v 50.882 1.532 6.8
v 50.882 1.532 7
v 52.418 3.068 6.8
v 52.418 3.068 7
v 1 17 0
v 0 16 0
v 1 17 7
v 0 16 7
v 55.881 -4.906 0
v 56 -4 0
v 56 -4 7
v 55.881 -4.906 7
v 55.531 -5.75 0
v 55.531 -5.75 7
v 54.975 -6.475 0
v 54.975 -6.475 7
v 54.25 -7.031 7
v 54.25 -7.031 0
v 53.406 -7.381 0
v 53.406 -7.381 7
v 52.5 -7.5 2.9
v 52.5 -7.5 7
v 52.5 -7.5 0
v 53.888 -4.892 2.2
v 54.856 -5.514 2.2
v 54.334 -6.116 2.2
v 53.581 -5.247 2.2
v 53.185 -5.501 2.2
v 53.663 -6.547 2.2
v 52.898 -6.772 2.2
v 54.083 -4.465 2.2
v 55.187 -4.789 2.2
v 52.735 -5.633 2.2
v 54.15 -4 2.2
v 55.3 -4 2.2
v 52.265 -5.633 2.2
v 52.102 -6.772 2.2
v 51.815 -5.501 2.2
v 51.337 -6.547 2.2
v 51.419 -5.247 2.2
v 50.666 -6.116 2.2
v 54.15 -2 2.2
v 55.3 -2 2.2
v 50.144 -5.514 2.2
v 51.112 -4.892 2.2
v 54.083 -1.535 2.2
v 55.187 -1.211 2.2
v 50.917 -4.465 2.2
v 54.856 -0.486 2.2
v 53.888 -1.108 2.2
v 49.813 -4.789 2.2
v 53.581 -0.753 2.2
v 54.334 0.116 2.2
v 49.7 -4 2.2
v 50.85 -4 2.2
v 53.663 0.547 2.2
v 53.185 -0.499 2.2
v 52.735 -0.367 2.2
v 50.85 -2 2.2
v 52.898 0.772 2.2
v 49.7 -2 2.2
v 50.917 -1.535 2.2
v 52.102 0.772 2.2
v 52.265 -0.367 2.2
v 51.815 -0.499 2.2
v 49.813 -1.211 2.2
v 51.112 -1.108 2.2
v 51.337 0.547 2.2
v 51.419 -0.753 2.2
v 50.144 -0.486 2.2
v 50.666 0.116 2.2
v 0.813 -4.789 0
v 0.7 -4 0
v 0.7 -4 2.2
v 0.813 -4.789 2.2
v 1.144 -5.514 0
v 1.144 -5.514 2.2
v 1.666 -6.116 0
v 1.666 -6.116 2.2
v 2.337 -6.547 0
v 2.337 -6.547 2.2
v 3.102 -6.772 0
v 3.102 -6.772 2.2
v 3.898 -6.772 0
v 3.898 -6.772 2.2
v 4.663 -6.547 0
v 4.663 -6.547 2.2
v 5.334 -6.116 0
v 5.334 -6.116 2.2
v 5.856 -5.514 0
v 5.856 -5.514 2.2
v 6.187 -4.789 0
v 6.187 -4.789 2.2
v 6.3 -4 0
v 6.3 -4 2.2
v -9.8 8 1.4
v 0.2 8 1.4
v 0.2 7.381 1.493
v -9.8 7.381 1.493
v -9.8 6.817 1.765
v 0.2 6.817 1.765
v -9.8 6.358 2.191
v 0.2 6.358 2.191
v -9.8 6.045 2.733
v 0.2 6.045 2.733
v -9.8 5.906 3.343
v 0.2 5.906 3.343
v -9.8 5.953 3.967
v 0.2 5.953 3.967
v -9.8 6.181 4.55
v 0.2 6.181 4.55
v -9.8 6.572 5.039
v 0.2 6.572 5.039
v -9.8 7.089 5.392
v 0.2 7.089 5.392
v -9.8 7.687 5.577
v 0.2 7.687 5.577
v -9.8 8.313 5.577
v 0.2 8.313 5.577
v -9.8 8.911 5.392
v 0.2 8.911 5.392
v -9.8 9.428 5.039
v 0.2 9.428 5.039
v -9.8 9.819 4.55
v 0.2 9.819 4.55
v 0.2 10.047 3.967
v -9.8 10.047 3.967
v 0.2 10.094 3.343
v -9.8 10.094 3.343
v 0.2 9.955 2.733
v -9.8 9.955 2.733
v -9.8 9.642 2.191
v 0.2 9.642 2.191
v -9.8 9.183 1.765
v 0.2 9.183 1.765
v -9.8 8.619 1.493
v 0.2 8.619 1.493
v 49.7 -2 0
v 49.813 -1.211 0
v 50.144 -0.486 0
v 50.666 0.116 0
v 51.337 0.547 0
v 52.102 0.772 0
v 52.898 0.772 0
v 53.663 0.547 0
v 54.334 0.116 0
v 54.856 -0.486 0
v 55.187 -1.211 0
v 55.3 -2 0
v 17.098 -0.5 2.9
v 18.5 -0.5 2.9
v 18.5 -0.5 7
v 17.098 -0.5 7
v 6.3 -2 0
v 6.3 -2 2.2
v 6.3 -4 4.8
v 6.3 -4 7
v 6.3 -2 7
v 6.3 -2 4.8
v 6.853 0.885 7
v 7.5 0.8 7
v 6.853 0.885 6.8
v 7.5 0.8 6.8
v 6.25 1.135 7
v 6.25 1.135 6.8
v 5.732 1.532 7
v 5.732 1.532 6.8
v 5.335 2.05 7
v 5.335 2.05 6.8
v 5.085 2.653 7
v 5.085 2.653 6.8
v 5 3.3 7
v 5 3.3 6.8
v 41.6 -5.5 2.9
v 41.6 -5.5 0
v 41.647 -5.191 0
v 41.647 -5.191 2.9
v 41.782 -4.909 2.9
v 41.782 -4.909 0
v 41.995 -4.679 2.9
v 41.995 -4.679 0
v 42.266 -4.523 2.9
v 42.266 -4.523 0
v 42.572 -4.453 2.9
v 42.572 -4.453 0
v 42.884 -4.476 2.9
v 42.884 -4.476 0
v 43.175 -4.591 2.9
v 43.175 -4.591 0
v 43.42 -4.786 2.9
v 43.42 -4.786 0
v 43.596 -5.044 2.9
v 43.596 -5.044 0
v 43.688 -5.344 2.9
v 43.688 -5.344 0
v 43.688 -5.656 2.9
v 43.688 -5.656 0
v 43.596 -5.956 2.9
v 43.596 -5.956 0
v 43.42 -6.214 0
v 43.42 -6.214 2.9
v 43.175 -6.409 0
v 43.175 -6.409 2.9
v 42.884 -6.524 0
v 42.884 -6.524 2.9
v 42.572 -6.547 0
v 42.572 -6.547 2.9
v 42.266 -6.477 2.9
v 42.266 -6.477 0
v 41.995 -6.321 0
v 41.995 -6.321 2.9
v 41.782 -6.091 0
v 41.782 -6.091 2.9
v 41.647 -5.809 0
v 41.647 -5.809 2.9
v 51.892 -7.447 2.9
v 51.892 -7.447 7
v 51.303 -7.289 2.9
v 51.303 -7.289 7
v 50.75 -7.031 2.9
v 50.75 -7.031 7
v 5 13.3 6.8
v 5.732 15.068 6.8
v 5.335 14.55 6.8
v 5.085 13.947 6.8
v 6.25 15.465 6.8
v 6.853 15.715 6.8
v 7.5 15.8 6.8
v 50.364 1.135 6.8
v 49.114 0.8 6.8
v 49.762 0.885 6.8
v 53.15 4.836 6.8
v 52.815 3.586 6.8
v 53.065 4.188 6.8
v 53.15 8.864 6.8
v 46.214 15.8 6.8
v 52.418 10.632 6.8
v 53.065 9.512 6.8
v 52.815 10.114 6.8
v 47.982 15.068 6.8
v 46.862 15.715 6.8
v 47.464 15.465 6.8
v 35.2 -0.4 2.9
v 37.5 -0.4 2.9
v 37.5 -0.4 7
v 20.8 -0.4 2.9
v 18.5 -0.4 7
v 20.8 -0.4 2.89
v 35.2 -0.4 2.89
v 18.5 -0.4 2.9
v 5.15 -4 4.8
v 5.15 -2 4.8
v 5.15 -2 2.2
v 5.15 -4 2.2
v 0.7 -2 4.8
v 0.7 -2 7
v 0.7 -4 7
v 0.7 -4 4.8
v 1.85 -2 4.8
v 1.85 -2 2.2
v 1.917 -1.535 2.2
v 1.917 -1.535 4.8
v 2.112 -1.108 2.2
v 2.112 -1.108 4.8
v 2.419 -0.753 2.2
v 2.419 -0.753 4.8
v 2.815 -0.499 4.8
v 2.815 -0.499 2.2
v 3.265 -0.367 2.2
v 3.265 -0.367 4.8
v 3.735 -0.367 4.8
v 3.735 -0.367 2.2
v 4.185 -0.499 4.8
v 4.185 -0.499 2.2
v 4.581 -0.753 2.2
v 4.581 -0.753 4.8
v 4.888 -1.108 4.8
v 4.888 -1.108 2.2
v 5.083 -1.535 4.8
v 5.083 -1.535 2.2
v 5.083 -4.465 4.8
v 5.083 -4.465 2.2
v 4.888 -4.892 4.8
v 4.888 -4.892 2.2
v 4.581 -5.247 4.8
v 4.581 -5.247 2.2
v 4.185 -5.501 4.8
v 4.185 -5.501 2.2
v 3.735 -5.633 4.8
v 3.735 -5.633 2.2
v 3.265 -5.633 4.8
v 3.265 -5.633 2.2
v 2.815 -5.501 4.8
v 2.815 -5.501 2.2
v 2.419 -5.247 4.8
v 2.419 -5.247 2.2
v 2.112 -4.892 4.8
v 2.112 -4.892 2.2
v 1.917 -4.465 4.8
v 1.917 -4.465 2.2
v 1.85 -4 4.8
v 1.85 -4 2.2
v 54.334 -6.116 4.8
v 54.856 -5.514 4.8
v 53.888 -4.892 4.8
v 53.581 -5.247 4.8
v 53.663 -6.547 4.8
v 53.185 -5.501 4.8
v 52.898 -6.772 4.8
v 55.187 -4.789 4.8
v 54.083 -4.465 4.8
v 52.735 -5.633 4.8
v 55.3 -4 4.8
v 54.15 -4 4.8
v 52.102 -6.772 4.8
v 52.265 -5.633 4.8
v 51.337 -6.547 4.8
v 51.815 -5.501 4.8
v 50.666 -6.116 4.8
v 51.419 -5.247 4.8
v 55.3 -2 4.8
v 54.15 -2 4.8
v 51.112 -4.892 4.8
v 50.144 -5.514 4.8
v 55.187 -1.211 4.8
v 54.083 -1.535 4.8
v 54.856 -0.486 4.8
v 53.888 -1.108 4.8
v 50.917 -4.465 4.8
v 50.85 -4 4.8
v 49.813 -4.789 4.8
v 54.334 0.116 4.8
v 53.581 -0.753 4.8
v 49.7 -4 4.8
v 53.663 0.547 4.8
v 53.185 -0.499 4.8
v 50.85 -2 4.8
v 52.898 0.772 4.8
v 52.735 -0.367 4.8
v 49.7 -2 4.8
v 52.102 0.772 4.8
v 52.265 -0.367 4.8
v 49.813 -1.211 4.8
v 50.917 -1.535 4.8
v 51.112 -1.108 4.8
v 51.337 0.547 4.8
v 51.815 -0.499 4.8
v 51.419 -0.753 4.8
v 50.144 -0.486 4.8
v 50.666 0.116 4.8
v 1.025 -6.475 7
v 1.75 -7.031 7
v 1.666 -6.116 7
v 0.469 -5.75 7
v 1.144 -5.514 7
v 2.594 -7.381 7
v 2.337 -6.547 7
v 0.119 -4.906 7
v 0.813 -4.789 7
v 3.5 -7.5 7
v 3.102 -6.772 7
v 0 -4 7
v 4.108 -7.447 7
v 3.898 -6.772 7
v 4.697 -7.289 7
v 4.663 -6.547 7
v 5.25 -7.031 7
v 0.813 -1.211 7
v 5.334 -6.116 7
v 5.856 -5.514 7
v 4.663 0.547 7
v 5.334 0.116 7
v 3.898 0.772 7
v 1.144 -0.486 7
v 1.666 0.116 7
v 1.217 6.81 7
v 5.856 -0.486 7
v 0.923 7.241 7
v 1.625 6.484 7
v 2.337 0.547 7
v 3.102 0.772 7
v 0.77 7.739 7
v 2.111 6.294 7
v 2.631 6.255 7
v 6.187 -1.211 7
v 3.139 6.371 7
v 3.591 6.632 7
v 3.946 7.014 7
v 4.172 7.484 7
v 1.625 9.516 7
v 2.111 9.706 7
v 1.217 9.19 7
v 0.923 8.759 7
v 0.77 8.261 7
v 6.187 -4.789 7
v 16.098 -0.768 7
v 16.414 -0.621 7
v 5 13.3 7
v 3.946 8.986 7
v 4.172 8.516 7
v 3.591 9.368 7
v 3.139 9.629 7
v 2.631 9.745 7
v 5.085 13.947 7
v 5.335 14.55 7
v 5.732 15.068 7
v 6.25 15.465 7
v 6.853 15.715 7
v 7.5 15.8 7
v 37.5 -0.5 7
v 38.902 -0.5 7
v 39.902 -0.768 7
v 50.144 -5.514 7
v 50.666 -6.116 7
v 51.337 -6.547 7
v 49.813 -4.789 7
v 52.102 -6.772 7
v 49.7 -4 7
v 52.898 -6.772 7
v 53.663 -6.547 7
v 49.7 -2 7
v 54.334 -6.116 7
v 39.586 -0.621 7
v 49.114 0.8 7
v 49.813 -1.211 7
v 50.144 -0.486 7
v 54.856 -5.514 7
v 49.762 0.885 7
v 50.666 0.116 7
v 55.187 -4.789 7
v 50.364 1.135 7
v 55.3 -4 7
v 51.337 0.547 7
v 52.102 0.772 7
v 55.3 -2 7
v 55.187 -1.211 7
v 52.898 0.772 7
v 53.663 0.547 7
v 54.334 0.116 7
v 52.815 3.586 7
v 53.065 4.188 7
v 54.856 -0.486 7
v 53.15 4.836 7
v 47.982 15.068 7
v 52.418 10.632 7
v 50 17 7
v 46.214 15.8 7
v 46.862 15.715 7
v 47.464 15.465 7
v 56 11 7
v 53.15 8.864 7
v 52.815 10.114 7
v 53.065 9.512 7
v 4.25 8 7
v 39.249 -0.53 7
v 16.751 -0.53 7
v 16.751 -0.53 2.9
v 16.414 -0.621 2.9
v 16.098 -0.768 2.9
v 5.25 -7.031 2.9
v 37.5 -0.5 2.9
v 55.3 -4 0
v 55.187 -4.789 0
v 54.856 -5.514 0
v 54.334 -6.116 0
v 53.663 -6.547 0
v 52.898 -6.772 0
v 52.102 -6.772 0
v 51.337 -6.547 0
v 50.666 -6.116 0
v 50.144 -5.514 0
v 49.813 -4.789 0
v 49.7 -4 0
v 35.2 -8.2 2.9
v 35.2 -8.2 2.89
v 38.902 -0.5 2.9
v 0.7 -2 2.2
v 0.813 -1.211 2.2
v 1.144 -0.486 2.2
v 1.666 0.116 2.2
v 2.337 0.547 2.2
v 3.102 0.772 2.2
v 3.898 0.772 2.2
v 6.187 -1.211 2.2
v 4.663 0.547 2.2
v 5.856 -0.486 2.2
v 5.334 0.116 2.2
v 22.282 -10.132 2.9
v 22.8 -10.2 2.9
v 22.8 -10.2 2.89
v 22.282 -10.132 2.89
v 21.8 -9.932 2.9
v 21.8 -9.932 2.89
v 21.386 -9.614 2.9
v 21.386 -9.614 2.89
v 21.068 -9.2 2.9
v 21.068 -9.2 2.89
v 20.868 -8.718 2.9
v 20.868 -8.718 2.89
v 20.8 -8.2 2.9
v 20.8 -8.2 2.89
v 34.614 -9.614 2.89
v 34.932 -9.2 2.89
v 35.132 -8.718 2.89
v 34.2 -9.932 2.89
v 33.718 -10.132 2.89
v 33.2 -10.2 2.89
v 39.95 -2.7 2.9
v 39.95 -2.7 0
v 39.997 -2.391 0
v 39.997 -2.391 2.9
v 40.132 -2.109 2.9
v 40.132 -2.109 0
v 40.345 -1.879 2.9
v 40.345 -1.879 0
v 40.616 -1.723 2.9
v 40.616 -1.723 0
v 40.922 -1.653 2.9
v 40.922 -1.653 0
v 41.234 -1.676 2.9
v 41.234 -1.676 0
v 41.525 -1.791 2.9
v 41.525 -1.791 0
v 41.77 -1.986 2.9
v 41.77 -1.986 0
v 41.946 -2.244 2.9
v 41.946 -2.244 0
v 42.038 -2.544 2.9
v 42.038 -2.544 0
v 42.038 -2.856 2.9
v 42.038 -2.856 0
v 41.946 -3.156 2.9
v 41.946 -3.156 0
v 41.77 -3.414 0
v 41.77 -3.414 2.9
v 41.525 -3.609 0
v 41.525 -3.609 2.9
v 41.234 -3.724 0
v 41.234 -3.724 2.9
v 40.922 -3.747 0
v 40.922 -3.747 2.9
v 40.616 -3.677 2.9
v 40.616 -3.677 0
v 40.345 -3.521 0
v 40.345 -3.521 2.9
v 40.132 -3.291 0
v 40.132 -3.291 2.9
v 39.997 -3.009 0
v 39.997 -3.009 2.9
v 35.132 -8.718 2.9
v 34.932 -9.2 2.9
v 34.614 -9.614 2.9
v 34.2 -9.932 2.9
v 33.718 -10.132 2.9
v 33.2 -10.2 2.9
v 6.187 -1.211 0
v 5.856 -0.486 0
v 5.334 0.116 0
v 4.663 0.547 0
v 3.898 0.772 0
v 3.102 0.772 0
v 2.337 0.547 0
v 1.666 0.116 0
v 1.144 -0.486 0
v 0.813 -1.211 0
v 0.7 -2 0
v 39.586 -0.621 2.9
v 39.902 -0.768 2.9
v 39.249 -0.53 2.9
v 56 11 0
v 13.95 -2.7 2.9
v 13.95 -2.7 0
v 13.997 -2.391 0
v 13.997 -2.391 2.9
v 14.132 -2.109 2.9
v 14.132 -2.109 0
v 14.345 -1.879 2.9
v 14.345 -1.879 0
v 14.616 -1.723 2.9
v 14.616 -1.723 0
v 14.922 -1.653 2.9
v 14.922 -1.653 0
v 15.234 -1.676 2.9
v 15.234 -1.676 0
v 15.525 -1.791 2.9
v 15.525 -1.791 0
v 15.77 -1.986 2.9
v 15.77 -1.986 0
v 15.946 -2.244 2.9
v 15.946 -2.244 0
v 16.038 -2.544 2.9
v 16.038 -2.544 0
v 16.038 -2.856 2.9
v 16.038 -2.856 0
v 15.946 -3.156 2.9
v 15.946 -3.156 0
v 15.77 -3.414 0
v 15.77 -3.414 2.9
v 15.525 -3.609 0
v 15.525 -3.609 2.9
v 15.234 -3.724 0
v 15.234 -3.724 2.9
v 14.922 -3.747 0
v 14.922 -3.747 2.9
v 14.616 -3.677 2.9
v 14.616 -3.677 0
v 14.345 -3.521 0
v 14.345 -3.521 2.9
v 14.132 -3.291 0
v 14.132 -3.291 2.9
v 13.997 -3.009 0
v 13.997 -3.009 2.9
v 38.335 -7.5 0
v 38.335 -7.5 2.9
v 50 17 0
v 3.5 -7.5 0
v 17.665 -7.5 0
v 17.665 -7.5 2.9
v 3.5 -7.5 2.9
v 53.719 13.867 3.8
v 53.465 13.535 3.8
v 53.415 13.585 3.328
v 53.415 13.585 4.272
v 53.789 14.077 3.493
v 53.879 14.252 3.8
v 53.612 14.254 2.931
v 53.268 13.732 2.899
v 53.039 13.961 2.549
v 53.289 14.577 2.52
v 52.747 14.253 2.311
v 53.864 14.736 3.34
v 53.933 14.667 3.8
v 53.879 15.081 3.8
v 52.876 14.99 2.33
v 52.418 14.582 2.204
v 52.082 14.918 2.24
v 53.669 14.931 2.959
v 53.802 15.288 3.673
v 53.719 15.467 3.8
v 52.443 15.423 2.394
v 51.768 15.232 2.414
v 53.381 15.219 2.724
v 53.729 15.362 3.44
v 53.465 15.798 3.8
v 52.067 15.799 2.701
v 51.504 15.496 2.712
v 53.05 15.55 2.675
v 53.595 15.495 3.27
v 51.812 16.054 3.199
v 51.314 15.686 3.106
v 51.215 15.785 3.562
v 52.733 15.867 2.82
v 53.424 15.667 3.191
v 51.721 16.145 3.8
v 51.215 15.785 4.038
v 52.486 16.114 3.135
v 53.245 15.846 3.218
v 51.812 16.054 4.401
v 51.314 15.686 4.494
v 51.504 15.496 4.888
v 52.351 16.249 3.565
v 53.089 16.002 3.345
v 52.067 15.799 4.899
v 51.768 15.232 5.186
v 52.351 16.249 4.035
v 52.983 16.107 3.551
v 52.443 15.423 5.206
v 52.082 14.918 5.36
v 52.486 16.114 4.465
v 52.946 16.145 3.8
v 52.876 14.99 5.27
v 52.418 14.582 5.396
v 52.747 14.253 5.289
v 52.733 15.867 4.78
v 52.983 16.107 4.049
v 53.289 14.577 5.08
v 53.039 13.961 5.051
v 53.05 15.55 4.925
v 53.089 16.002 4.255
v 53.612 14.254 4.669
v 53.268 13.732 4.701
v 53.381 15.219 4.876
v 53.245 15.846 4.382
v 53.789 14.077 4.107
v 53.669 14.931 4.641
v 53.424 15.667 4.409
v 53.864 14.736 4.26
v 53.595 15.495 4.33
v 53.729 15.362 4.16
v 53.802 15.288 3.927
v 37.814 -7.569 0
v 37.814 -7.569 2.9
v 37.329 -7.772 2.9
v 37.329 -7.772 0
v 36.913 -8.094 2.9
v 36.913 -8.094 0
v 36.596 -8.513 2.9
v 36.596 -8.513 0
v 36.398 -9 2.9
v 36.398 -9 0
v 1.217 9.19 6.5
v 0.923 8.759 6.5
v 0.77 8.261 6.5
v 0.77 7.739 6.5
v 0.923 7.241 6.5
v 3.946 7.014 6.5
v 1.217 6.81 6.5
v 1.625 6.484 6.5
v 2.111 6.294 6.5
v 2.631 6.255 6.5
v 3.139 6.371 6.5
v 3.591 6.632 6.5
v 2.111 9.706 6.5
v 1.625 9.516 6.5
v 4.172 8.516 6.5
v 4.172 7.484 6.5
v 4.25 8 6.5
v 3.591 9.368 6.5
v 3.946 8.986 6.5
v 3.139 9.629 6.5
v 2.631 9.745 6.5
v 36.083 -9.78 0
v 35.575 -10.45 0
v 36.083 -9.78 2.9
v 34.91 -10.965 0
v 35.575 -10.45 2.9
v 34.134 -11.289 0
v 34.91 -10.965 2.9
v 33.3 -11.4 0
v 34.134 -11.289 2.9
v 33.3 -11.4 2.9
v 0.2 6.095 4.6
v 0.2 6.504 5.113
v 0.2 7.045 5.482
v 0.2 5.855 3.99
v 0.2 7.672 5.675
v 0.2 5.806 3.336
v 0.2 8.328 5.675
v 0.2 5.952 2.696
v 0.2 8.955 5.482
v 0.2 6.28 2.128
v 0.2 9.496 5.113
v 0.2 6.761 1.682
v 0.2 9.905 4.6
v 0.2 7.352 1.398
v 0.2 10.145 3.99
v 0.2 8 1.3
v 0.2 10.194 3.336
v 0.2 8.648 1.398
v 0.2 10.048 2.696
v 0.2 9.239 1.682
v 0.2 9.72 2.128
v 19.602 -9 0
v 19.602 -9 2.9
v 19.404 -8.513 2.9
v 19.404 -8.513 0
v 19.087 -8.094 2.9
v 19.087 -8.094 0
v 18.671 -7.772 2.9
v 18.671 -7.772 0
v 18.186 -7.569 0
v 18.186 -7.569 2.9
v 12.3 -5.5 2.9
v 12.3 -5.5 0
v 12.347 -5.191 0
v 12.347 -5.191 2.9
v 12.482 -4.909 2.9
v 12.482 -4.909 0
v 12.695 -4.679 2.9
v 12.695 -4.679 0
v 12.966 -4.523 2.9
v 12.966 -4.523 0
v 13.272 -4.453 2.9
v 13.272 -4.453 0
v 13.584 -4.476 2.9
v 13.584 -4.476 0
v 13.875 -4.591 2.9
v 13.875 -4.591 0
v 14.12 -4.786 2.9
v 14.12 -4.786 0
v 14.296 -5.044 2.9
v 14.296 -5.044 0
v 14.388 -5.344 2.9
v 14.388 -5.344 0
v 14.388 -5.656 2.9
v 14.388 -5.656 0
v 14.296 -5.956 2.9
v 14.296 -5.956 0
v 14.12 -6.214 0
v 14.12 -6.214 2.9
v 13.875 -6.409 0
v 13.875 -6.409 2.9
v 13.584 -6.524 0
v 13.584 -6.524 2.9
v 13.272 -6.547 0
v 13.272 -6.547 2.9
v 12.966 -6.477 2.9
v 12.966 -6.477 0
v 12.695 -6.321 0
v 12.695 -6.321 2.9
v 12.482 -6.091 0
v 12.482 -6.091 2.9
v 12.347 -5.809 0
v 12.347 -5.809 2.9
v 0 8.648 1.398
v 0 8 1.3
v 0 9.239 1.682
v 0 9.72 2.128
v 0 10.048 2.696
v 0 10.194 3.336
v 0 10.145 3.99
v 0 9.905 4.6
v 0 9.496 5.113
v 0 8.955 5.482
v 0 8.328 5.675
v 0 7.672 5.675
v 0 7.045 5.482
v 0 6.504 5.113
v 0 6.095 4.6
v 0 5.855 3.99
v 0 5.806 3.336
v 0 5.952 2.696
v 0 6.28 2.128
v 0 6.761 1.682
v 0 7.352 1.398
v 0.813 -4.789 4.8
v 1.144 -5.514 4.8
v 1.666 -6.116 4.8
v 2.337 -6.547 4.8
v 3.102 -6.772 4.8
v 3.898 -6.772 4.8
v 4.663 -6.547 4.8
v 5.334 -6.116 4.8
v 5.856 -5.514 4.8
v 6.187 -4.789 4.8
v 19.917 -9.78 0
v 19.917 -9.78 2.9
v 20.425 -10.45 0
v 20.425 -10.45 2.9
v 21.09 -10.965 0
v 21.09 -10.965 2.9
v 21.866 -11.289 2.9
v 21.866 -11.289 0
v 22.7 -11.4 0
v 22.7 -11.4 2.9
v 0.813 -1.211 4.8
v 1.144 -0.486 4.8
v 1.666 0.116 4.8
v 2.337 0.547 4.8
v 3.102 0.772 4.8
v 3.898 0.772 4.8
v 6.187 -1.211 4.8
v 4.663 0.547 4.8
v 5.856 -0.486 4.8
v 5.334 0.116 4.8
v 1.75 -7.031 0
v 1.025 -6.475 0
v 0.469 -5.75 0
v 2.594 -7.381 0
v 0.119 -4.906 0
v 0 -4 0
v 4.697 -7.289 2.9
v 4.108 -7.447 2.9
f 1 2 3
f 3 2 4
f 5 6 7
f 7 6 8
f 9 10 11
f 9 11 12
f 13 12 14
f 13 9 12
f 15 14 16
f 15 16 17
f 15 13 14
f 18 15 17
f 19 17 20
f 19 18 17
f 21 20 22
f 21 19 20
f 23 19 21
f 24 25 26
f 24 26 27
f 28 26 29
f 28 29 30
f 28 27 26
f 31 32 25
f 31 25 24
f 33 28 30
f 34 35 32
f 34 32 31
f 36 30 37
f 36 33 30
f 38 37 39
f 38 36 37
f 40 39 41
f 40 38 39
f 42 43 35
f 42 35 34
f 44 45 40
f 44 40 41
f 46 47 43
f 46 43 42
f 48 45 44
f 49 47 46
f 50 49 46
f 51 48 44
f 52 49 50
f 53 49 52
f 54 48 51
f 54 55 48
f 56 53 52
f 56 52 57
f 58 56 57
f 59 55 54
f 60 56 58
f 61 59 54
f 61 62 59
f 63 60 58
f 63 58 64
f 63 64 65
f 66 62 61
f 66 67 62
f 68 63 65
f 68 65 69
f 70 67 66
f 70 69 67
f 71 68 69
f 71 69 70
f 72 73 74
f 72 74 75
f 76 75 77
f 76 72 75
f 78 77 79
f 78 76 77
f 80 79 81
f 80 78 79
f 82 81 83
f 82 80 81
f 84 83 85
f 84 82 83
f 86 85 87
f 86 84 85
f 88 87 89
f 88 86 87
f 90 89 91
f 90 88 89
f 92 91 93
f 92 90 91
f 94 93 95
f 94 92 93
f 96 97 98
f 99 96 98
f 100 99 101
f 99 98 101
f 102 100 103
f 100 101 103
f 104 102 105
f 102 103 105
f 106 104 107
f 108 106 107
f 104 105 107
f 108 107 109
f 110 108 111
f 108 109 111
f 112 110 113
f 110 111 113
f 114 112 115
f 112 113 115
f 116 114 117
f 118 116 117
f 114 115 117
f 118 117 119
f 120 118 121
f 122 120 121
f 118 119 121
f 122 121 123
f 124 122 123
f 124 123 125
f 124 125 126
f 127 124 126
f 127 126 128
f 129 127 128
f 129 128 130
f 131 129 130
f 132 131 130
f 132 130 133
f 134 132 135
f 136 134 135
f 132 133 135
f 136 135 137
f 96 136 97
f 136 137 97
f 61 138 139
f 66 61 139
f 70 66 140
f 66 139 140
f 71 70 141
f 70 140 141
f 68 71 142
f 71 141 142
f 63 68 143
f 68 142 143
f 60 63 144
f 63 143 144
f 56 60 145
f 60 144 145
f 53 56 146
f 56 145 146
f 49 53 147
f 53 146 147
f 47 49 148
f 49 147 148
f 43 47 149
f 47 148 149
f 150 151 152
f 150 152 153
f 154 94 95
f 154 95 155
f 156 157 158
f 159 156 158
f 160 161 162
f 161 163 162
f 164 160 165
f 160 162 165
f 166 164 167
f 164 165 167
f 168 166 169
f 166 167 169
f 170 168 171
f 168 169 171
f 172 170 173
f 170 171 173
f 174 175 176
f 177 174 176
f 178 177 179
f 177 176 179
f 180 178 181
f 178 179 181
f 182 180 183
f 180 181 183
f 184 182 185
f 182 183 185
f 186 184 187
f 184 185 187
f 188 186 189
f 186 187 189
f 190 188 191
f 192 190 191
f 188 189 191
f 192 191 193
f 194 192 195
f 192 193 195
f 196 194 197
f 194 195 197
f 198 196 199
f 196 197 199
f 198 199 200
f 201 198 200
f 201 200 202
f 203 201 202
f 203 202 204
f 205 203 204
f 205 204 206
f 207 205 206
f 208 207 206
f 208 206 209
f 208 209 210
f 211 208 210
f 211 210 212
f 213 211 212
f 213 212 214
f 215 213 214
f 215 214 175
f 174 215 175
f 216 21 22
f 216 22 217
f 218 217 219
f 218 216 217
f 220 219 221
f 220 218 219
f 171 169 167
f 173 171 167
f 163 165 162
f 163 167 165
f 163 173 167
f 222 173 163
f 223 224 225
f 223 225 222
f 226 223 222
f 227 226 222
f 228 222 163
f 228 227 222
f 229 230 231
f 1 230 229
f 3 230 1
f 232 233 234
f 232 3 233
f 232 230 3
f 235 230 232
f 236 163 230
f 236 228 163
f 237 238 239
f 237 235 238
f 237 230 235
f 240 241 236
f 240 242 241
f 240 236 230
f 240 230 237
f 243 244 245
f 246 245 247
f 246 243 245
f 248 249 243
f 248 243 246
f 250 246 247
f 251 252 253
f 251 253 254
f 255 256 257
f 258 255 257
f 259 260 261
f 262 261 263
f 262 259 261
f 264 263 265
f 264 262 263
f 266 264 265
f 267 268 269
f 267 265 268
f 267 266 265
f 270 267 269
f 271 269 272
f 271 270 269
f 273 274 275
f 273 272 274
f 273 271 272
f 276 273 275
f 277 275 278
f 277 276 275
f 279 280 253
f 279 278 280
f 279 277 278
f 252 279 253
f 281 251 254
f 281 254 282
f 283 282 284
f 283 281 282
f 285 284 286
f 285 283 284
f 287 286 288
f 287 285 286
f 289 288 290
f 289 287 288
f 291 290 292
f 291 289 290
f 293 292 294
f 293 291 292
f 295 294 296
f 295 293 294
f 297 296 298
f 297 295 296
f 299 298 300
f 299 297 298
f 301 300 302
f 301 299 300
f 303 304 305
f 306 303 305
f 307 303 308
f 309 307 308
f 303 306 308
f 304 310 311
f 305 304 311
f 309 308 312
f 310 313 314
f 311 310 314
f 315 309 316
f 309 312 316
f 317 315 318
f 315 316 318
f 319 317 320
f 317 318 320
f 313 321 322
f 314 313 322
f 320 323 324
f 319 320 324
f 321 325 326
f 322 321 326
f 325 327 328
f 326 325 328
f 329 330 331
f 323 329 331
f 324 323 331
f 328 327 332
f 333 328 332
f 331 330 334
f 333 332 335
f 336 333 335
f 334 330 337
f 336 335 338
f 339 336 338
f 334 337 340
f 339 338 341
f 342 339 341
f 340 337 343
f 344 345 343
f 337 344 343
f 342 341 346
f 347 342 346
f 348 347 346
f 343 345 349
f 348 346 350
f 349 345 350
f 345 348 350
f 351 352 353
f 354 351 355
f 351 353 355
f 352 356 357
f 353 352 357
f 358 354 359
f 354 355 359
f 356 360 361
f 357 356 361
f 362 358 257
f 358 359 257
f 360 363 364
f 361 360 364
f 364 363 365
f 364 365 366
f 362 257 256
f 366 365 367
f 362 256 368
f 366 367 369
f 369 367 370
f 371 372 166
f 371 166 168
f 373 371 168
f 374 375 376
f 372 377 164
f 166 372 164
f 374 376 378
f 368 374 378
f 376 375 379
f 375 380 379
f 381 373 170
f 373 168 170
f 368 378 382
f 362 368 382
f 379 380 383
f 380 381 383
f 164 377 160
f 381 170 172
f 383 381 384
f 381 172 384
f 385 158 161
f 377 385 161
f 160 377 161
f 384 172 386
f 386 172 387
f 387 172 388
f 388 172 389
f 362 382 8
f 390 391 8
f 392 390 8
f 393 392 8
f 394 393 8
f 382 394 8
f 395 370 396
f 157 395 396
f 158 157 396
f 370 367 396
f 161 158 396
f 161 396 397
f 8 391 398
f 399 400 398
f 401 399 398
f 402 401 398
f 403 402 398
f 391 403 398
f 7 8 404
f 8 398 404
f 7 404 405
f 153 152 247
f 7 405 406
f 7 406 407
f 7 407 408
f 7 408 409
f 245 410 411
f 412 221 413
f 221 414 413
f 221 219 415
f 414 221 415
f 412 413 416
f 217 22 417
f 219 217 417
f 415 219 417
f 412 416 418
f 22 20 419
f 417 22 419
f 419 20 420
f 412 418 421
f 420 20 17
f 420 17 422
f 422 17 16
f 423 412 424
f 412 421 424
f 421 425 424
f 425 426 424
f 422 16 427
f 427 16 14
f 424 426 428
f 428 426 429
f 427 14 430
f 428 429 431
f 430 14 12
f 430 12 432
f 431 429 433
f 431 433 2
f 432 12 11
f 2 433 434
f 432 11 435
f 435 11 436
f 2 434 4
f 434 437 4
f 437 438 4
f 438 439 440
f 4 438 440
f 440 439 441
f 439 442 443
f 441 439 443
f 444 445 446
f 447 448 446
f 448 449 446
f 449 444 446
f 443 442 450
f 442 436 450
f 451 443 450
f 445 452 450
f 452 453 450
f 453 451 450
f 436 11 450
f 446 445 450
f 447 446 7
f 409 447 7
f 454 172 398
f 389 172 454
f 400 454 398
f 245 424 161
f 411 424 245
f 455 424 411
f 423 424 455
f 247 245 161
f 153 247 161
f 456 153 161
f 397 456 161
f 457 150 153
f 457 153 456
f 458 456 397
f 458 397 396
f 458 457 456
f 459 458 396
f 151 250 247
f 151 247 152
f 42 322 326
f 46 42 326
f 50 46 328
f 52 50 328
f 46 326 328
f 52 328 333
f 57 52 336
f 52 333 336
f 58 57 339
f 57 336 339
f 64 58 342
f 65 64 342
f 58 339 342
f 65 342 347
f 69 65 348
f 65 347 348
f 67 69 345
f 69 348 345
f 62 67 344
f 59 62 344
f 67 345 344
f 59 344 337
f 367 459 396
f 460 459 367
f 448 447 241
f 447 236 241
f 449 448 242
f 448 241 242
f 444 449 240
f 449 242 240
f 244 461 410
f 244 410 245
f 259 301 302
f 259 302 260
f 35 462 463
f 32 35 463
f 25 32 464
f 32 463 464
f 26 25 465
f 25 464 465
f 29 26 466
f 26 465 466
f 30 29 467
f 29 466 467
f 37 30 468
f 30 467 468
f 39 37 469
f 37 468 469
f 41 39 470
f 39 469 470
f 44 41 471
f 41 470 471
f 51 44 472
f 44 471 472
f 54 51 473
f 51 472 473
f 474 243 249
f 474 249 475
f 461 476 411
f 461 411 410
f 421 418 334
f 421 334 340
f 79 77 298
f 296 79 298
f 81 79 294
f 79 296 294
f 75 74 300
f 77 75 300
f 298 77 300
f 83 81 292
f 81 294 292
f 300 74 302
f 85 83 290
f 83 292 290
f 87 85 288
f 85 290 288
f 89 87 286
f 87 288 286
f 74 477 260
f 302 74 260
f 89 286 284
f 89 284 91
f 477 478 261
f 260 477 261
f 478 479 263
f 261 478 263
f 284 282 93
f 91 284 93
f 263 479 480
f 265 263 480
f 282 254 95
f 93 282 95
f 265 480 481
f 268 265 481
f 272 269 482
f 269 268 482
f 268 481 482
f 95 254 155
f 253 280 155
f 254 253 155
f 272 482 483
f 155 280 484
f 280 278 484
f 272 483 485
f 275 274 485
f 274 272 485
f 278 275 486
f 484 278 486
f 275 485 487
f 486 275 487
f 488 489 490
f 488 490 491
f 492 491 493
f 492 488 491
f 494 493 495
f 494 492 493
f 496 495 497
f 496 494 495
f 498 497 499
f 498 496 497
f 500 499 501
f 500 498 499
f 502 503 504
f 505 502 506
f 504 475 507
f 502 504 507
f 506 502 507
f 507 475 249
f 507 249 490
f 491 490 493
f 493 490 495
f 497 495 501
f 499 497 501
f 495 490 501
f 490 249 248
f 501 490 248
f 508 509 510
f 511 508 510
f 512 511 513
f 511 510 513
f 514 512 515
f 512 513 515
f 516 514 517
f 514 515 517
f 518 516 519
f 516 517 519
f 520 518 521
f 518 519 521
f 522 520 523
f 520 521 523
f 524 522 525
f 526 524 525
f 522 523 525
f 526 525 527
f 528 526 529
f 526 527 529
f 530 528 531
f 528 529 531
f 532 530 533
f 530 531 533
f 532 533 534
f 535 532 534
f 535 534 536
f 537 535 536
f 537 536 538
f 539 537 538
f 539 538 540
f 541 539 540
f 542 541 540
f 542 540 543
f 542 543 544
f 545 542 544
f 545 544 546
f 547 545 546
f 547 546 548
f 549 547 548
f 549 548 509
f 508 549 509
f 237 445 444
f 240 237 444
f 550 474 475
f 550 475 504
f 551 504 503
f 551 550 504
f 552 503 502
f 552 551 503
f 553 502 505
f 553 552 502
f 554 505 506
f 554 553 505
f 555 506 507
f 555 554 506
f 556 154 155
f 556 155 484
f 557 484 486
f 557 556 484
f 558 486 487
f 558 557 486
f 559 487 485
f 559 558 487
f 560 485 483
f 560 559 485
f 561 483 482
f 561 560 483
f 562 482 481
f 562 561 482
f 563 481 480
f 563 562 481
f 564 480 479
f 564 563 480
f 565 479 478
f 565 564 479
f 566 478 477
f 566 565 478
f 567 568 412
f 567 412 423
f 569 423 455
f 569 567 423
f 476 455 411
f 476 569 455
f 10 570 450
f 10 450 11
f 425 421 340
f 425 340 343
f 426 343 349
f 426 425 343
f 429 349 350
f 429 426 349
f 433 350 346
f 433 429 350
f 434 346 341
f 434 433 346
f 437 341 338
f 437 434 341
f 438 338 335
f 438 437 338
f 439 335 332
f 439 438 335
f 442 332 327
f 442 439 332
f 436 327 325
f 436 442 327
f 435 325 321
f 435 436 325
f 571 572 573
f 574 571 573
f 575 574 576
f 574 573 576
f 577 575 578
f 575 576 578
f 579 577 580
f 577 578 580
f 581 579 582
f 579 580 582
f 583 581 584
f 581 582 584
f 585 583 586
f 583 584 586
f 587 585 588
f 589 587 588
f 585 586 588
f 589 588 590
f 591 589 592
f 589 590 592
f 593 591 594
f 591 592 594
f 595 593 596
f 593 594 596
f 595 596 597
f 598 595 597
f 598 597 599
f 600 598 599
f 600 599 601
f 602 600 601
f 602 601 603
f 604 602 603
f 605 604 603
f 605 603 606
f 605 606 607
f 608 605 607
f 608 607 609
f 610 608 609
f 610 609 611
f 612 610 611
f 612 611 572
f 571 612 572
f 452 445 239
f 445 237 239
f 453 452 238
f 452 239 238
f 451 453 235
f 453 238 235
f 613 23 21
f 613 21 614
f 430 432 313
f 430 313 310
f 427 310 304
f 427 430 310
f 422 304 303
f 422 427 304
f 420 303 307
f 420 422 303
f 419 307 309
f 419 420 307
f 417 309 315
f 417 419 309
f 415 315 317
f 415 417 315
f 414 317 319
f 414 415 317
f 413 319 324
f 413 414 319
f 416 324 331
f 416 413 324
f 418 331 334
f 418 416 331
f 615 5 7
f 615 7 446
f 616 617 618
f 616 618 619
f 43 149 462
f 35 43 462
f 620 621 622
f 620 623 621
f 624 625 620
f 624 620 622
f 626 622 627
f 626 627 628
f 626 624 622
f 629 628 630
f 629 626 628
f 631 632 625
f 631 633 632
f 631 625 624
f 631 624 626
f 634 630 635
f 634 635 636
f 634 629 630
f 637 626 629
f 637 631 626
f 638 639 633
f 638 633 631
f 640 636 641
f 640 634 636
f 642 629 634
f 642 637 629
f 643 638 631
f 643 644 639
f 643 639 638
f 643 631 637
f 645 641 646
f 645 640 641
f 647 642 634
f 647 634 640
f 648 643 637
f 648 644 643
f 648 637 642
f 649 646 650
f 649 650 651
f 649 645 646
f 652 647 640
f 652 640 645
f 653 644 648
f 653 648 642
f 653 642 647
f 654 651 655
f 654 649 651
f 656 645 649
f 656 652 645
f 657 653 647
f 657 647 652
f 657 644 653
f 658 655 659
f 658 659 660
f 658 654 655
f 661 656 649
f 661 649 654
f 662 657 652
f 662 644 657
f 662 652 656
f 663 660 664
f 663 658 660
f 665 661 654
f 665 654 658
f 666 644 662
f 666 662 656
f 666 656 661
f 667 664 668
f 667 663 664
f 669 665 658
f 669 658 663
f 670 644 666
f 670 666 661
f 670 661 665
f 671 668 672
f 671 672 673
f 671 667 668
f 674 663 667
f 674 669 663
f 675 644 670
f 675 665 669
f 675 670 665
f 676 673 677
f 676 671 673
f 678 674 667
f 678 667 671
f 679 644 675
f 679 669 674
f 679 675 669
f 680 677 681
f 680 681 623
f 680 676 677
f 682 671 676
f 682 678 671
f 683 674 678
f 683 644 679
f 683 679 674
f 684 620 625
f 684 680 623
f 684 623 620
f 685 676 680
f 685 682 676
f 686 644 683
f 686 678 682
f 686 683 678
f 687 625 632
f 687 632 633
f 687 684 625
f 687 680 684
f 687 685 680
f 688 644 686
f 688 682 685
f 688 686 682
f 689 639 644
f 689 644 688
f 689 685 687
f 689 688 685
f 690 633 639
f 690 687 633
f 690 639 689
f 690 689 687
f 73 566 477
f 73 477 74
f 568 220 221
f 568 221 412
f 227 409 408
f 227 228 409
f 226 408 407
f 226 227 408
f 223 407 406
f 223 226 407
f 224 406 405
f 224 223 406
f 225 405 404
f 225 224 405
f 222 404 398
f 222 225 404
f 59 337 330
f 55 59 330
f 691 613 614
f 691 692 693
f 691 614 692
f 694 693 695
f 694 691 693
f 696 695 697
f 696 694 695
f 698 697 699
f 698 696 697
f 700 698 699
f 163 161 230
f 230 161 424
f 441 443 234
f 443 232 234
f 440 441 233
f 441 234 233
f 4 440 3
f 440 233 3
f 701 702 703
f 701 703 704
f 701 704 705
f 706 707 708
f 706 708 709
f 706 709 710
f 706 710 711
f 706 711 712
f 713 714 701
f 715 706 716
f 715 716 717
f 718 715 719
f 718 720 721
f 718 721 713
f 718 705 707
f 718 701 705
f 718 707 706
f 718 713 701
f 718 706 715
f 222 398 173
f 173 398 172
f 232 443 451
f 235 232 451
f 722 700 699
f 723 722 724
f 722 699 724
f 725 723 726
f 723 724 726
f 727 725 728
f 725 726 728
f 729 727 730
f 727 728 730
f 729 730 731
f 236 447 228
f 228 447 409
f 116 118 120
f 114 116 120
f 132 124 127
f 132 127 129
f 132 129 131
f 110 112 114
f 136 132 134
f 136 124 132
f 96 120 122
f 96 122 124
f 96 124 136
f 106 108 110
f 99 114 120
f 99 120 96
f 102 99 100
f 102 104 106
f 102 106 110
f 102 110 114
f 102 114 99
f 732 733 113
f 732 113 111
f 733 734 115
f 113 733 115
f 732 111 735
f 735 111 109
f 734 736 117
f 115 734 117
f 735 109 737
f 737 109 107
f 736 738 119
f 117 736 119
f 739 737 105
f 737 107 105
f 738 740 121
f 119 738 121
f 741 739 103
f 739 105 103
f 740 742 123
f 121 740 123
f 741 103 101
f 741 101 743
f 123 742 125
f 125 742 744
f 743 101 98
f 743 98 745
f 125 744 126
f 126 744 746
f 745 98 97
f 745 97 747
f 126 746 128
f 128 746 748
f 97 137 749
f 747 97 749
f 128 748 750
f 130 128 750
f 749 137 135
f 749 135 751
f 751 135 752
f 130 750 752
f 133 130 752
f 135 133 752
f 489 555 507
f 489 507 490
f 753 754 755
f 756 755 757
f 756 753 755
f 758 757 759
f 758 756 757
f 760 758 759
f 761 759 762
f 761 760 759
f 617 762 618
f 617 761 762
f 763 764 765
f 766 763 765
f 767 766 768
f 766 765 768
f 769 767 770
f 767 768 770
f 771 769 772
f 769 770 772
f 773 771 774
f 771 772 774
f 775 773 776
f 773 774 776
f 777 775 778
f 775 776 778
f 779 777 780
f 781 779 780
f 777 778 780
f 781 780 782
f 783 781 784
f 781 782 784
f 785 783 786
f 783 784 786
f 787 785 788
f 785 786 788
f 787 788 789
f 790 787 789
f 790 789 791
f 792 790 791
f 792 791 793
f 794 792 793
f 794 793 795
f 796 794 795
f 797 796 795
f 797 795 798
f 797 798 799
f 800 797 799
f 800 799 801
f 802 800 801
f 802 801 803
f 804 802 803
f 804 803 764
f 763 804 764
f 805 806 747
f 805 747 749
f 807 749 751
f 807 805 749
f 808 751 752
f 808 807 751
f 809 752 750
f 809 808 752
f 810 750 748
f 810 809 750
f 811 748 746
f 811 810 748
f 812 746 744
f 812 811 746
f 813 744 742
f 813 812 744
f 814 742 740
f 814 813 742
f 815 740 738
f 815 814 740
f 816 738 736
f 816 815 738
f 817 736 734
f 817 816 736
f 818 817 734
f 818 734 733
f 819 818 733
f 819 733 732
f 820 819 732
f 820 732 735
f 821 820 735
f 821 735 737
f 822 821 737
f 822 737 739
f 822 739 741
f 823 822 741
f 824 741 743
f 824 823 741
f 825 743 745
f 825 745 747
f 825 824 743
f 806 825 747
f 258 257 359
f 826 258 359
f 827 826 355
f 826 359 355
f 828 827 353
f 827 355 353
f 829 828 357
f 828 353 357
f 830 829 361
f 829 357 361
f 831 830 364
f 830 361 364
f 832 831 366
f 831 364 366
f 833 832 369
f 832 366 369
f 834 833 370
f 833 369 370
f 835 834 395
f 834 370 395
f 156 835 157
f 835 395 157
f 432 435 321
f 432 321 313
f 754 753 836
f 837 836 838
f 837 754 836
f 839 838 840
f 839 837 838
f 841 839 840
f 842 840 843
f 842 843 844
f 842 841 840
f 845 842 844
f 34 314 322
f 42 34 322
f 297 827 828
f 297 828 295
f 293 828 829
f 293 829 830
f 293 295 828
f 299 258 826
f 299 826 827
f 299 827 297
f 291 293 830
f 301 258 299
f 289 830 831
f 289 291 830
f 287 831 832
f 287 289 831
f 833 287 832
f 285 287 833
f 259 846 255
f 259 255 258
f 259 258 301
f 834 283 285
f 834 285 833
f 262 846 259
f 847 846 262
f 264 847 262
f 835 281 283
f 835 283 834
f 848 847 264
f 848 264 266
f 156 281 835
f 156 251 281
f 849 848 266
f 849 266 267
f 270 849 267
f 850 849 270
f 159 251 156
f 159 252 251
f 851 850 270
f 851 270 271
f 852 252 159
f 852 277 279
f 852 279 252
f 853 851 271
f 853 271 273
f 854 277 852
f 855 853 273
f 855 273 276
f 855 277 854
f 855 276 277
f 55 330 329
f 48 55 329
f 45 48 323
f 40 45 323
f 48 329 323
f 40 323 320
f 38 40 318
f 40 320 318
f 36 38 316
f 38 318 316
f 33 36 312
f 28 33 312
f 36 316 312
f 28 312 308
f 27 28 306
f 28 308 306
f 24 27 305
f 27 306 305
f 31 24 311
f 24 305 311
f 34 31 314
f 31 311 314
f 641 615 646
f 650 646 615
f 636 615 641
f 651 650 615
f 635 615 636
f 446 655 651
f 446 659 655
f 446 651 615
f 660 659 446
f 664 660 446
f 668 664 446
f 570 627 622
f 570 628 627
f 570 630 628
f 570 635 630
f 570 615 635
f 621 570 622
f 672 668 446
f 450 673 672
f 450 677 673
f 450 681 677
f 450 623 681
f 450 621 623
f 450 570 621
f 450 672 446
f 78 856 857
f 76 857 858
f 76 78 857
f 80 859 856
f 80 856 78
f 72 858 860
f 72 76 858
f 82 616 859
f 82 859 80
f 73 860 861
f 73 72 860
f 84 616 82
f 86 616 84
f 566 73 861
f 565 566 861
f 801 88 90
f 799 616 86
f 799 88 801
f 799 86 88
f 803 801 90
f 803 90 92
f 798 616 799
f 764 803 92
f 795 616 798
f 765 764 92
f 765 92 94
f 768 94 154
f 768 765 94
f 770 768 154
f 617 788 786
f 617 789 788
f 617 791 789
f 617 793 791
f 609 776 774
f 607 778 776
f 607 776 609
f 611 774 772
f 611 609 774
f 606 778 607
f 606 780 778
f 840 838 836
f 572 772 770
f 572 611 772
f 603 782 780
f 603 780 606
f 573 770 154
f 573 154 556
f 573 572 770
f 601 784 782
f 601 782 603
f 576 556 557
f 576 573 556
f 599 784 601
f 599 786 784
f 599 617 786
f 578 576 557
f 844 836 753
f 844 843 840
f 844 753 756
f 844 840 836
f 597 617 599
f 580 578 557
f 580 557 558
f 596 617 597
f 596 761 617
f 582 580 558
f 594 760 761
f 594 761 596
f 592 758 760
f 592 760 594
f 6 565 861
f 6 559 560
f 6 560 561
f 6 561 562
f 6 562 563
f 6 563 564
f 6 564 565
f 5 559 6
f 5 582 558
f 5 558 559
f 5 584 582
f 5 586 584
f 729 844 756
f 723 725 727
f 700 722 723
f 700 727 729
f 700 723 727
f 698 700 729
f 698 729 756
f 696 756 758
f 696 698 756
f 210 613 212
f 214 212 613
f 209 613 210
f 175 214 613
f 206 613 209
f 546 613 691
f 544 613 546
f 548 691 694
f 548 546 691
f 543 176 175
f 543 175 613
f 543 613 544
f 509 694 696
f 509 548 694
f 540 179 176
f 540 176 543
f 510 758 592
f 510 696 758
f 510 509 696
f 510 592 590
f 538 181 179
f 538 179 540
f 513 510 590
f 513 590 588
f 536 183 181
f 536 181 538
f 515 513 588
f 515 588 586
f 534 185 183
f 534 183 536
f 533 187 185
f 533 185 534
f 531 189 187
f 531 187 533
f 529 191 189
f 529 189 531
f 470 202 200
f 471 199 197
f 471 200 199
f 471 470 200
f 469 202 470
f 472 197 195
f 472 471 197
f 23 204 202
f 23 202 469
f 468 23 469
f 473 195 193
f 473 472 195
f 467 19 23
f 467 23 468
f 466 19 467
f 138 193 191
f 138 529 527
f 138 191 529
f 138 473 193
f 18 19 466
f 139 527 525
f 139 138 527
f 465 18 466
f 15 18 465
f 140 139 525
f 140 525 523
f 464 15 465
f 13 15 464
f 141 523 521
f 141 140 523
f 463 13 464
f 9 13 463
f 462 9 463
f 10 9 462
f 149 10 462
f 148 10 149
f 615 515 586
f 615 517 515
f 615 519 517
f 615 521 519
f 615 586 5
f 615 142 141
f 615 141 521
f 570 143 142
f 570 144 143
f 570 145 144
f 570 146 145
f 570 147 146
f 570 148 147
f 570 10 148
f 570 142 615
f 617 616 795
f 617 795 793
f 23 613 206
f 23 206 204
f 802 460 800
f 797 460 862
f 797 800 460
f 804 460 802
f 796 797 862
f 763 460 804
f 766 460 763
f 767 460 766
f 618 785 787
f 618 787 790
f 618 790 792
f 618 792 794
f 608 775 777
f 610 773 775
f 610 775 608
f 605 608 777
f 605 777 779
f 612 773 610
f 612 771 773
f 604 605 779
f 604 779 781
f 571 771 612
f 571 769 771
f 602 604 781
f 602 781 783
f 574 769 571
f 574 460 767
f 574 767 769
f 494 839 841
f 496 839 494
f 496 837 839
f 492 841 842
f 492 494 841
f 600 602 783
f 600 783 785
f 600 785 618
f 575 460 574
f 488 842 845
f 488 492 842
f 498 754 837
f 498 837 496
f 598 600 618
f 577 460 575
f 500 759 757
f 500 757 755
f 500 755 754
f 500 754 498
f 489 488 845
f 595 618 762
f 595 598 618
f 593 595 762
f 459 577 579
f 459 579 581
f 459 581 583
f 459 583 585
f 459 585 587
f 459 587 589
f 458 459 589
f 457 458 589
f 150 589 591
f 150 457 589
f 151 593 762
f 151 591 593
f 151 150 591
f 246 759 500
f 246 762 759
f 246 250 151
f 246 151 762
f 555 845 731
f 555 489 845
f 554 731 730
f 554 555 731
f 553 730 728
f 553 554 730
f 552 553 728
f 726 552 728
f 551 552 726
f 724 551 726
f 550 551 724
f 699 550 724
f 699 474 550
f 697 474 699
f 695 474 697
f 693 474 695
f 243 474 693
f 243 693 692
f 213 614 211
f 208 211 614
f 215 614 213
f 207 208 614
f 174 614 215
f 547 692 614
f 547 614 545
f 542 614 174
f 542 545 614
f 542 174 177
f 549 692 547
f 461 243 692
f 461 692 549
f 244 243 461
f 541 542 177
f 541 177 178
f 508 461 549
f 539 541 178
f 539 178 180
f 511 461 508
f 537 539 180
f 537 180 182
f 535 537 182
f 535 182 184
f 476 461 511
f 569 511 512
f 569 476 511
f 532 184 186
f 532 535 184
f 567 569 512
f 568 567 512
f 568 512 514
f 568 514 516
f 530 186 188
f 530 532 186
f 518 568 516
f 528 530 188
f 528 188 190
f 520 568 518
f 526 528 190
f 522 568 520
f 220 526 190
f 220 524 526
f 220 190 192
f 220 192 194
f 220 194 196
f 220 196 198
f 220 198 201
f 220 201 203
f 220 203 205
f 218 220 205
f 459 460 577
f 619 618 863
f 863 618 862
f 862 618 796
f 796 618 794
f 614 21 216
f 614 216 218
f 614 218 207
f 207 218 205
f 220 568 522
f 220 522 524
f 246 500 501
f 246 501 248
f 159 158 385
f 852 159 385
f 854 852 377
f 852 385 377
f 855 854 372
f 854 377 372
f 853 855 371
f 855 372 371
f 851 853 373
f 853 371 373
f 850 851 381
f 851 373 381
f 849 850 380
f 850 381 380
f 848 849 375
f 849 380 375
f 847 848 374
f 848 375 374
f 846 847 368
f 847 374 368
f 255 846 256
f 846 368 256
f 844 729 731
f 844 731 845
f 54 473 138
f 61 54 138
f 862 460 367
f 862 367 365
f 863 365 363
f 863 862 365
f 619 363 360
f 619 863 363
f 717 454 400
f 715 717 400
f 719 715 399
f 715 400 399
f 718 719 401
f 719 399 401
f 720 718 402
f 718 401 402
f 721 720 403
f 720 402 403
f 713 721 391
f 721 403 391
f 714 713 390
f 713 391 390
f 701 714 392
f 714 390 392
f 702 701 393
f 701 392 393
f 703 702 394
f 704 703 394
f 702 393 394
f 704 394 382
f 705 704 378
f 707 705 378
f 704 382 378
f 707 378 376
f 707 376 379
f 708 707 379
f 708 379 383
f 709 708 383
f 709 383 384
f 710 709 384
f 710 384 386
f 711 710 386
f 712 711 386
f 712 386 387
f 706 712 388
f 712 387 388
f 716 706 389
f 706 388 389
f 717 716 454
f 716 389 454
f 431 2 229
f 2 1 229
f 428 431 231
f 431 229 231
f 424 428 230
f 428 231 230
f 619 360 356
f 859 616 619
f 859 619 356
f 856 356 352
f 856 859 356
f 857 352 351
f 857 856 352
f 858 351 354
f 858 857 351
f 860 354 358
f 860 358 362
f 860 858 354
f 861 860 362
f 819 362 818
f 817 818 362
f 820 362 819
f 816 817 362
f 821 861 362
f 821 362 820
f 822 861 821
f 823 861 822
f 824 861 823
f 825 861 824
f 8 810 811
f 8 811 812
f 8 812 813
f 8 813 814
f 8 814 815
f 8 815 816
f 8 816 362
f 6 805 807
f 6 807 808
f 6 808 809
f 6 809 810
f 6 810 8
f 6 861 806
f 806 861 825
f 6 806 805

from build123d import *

# Parameters (mm, degrees)
BOSS_EXTRUDE1_DEPTH  = 7
CUT_EXTRUDE1_DEPTH   = 0.2
FILLET1_R            = 2.5
CHAMFER1_SIZE        = 6
CUT_EXTRUDE4_DEPTH   = 2.2
CUT_EXTRUDE5_DEPTH   = 59.720013624
SKETCH14_R           = 2.2
CUT_EXTRUDE9_DEPTH   = 0.2
CUT_EXTRUDE10_DEPTH  = 4.11
CHAMFER3_SIZE        = 1
FILLET3_R            = 3.2
SKETCH29_R           = 1.05
CUT_EXTRUDE16_DEPTH  = 10
FILLET5_R            = 2
FILLET6_R            = 2
MIRROR2_COPY_1_DEPTH = 2.2
SKETCH31_R           = 1.75
CUT_EXTRUDE17_DEPTH  = 0.5
CUT_EXTRUDE19_START  = -4.1
CUT_EXTRUDE19_DEPTH  = 4.1
SKETCH33_R           = 2.1
BOSS_EXTRUDE2_DEPTH  = 10


with BuildPart() as part:
    # Sketch1 → Boss-Extrude1 (new body)
    with BuildSketch(Plane.XY):
        with BuildLine():
            Line((0, -4), (0, 17))
            Line((0, 17), (56, 17))
            Line((56, 17), (56, -4))
            ThreePointArc((56, -4), (54.974873734, -6.474873734), (52.5, -7.5))
            Line((52.5, -7.5), (36.5, -7.5))
            Line((36.5, -7.5), (36.5, -11.4))
            Line((36.5, -11.4), (19.5, -11.4))
            Line((19.5, -11.4), (19.5, -7.5))
            Line((19.5, -7.5), (3.5, -7.5))
            ThreePointArc((3.5, -7.5), (1.025126266, -6.474873734), (0, -4))
        make_face()
    extrude(amount=BOSS_EXTRUDE1_DEPTH)

    # Sketch2 → Cut-Extrude1 (cut)
    with BuildSketch(Plane.XY.offset(7)):
        Polygon((5, 15.8), (5, 0.8), (50.15, 0.8), (53.15, 3.8), (53.15, 9.9), (47.25, 15.8), align=None)
    extrude(amount=-CUT_EXTRUDE1_DEPTH, mode=Mode.SUBTRACT)

    # Fillet1
    fillet1_edges = [part.edges().sort_by_distance(p)[0] for p in [
        (47.25, 15.8, 6.9),
        (53.15, 9.9, 6.9),
        (53.15, 3.8, 6.9),
        (50.15, 0.8, 6.9),
        (5, 0.8, 6.9),
        (5, 15.8, 6.9),
    ]]
    fillet(fillet1_edges, radius=FILLET1_R)

    # Chamfer1
    chamfer1_edges = [part.edges().sort_by_distance(p)[0] for p in [
        (56, 17, 3.5),
    ]]
    chamfer(chamfer1_edges, length=CHAMFER1_SIZE)

    # Sketch6 → Cut-Extrude4 (cut)
    with BuildSketch(Plane.XY.offset(7)):
        with BuildLine():
            Line((49.7, -4), (49.7, -2))
            ThreePointArc((49.7, -2), (52.5, 0.8), (55.3, -2))
            Line((55.3, -2), (55.3, -4))
            ThreePointArc((55.3, -4), (52.5, -6.8), (49.7, -4))
        make_face()
    cut_extrude4 = extrude(amount=-CUT_EXTRUDE4_DEPTH, mode=Mode.SUBTRACT)

    # Sketch9 → Cut-Extrude5 (cut, through all)
    with BuildSketch(Plane.XY.offset(4.8)):
        with BuildLine():
            Line((54.15, -4), (54.15, -2))
            ThreePointArc((54.15, -2), (52.5, -0.35), (50.85, -2))
            Line((50.85, -2), (50.85, -4))
            ThreePointArc((50.85, -4), (52.5, -5.65), (54.15, -4))
        make_face()
    cut_extrude5 = extrude(amount=-CUT_EXTRUDE5_DEPTH, mode=Mode.SUBTRACT)

    # Mirror1: Cut-Extrude4 across plane
    add(cut_extrude4.mirror(Plane.XY.offset(3.5)), mode=Mode.SUBTRACT)

    # Sketch14 → Cut-Extrude9 (cut)
    with BuildSketch(Plane(origin=(0, 24, 0), x_dir=(0, -1, 0), z_dir=(1, 0, 0))):
        with Locations(Location((16, -3.5, 0), (0, 0, 90))):
            Circle(SKETCH14_R)
    extrude(amount=CUT_EXTRUDE9_DEPTH, mode=Mode.SUBTRACT)

    # Sketch19 → Cut-Extrude10 (cut)
    with BuildSketch(Plane.XY.offset(7)):
        with BuildLine():
            Line((20.8, -0.4), (35.2, -0.4))
            Line((35.2, -0.4), (35.2, -8.2))
            ThreePointArc((35.2, -8.2), (34.614213562, -9.614213562), (33.2, -10.2))
            Line((33.2, -10.2), (22.8, -10.2))
            ThreePointArc((22.8, -10.2), (21.385786438, -9.614213562), (20.8, -8.2))
            Line((20.8, -8.2), (20.8, -0.4))
        make_face()
    extrude(amount=-CUT_EXTRUDE10_DEPTH, mode=Mode.SUBTRACT)

    # Chamfer3
    chamfer3_edges = [part.edges().sort_by_distance(p)[0] for p in [
        (0, 17, 3.5),
    ]]
    chamfer(chamfer3_edges, length=CHAMFER3_SIZE)

    # Fillet3
    fillet3_edges = [part.edges().sort_by_distance(p)[0] for p in [
        (36.5, -11.4, 3.5),
        (19.5, -11.4, 3.5),
    ]]
    fillet(fillet3_edges, radius=FILLET3_R)

    # Sketch29 → Cut-Extrude16 (cut)
    with BuildSketch(Plane(origin=(0, 0, 0), x_dir=(-1, 0, 0), z_dir=(0, 0, -1))):
        with Locations((-42.65, -5.5)):
            Circle(SKETCH29_R)
        with Locations((-41, -2.7)):
            Circle(SKETCH29_R)
        with Locations((-13.35, -5.5)):
            Circle(SKETCH29_R)
        with Locations((-15, -2.7)):
            Circle(SKETCH29_R)
    extrude(amount=-CUT_EXTRUDE16_DEPTH, mode=Mode.SUBTRACT)

    # Fillet5
    # the kernel refuses this fillet: 2 mm, written as the material it adds along each edge
    with BuildSketch(Plane(origin=(19.5, -7.5, 0), x_dir=(0.06758731351152399, -0.9977133631721562, 0), z_dir=(0, 0, 1))) as fillet5_piece_1:
        with BuildLine():
            CenterArc((1.871412228, -1.965857277), FILLET5_R, 100.602090028, 75.522487814)
            Line((-0.124014498, -1.83068265), (-0.323557171, -1.817165187))
            Line((-0.323557171, -1.817165187), (-0.199542673, 0.013517463))
            Line((-0.199542673, 0.013517463), (0.013517463, 0.199542673))
            ThreePointArc((0.013517463, 0.199542673), (0.711916817, 0.152231553), (1.466640375, 0.196585728))
            Line((1.466640375, 0.196585728), (1.503437816, 0))
        make_face()
    extrude(amount=7)
    # the kernel refuses this fillet: 2 mm, written as the material it takes off along each edge

    # Fillet6
    # the kernel refuses this fillet: 2 mm, written as the material it adds along each edge
    with BuildSketch(Plane(origin=(36.5, -7.5, 0), x_dir=(-0.06758731351152392, -0.9977133631721562, 0), z_dir=(0, 0, 1))) as fillet6_piece_1:
        with BuildLine():
            CenterArc((1.871412228, 1.965857277), FILLET6_R, 183.875422158, 75.522487814)
            Line((-0.124014498, 1.83068265), (-0.323557171, 1.817165187))
            Line((-0.323557171, 1.817165187), (-0.199542673, -0.013517463))
            Line((-0.199542673, -0.013517463), (0.013517463, -0.199542673))
            ThreePointArc((0.013517463, -0.199542673), (0.711916817, -0.152231553), (1.466640375, -0.196585728))
            Line((1.466640375, -0.196585728), (1.503437816, 0))
        make_face()
    extrude(amount=7)
    # the kernel refuses this fillet: 2 mm, written as the material it takes off along each edge

    # Mirror2: Cut-Extrude4, Cut-Extrude5 across plane
    add(cut_extrude4.mirror(Plane.ZY.offset(-28)), mode=Mode.SUBTRACT)
    add(cut_extrude5.mirror(Plane.ZY.offset(-28)), mode=Mode.SUBTRACT)

    # Mirror2 copy 1 sketch → Mirror2 copy 1 (cut)
    with BuildSketch(Plane(origin=(56, 0, 0), x_dir=(-1, 0, 0), z_dir=(0, 0, -1))):
        with BuildLine():
            Line((49.7, -4), (49.7, -2))
            ThreePointArc((49.7, -2), (52.5, 0.8), (55.3, -2))
            Line((55.3, -2), (55.3, -4))
            ThreePointArc((55.3, -4), (52.5, -6.8), (49.7, -4))
        make_face()
    extrude(amount=-MIRROR2_COPY_1_DEPTH, mode=Mode.SUBTRACT)

    # Sketch31 → Cut-Extrude17 (cut)
    with BuildSketch(Plane.XY.offset(7)):
        with Locations((2.5, 8)):
            Circle(SKETCH31_R)
    extrude(amount=-CUT_EXTRUDE17_DEPTH, mode=Mode.SUBTRACT)

    # Sketch28 → Cut-Extrude19 (cut)
    with BuildSketch(Plane.XY.offset(7).offset(CUT_EXTRUDE19_START)):
        with BuildLine():
            Line((16.098076211, -0.767949192), (5.25, -7.031088913))
            ThreePointArc((5.25, -7.031088913), (4.405866658, -7.380740392), (3.5, -7.5))
            Line((3.5, -7.5), (16.682429586, -7.5))
            ThreePointArc((16.682429586, -7.5), (17.389536367, -7.792893219), (17.682429586, -8.5))
            Line((17.682429586, -8.5), (17.682429586, -14.577281055))
            Line((17.682429586, -14.577281055), (38.317570414, -14.577281055))
            Line((38.317570414, -14.577281055), (38.317570414, -8.5))
            ThreePointArc((38.317570414, -8.5), (38.610463633, -7.792893219), (39.317570414, -7.5))
            Line((39.317570414, -7.5), (52.5, -7.5))
            ThreePointArc((52.5, -7.5), (51.594133342, -7.380740392), (50.75, -7.031088913))
            Line((50.75, -7.031088913), (39.901923789, -0.767949192))
            ThreePointArc((39.901923789, -0.767949192), (39.419561879, -0.568148347), (38.901923789, -0.5))
            Line((38.901923789, -0.5), (37.5, -0.5))
            Line((37.5, -0.5), (37.5, -0.4))
            Line((37.5, -0.4), (18.5, -0.4))
            Line((18.5, -0.4), (18.5, -0.5))
            Line((18.5, -0.5), (17.098076211, -0.5))
            ThreePointArc((17.098076211, -0.5), (16.580438121, -0.568148347), (16.098076211, -0.767949192))
        make_face()
    extrude(amount=CUT_EXTRUDE19_DEPTH, mode=Mode.SUBTRACT)

    # Sketch32 → Revolve1 (revolve)
    with BuildSketch(Plane(origin=(0, 0, 3.8), x_dir=(-1, 0, 0), z_dir=(0, 0, -1))):
        with BuildLine():
            Line((-52.333452378, 14.666547622), (-53.464823228, 13.535176772))
            ThreePointArc((-53.464823228, 13.535176772), (-53.933452378, 14.666547622), (-53.464823228, 15.797918472))
            Line((-53.464823228, 15.797918472), (-52.333452378, 14.666547622))
        make_face()
    revolve(axis=Axis((52.333452378, 14.666547622, 3.8), (0.7071067811865478, 0.7071067811865472, 0)))

    # Sketch33 → Boss-Extrude2 (add)
    with BuildSketch(Plane.ZY.offset(-0.2)):
        with Locations(Location((3.5, 8, 0), (0, 0, 180))):
            Circle(SKETCH33_R)
    extrude(amount=BOSS_EXTRUDE2_DEPTH)


solid = part.part
